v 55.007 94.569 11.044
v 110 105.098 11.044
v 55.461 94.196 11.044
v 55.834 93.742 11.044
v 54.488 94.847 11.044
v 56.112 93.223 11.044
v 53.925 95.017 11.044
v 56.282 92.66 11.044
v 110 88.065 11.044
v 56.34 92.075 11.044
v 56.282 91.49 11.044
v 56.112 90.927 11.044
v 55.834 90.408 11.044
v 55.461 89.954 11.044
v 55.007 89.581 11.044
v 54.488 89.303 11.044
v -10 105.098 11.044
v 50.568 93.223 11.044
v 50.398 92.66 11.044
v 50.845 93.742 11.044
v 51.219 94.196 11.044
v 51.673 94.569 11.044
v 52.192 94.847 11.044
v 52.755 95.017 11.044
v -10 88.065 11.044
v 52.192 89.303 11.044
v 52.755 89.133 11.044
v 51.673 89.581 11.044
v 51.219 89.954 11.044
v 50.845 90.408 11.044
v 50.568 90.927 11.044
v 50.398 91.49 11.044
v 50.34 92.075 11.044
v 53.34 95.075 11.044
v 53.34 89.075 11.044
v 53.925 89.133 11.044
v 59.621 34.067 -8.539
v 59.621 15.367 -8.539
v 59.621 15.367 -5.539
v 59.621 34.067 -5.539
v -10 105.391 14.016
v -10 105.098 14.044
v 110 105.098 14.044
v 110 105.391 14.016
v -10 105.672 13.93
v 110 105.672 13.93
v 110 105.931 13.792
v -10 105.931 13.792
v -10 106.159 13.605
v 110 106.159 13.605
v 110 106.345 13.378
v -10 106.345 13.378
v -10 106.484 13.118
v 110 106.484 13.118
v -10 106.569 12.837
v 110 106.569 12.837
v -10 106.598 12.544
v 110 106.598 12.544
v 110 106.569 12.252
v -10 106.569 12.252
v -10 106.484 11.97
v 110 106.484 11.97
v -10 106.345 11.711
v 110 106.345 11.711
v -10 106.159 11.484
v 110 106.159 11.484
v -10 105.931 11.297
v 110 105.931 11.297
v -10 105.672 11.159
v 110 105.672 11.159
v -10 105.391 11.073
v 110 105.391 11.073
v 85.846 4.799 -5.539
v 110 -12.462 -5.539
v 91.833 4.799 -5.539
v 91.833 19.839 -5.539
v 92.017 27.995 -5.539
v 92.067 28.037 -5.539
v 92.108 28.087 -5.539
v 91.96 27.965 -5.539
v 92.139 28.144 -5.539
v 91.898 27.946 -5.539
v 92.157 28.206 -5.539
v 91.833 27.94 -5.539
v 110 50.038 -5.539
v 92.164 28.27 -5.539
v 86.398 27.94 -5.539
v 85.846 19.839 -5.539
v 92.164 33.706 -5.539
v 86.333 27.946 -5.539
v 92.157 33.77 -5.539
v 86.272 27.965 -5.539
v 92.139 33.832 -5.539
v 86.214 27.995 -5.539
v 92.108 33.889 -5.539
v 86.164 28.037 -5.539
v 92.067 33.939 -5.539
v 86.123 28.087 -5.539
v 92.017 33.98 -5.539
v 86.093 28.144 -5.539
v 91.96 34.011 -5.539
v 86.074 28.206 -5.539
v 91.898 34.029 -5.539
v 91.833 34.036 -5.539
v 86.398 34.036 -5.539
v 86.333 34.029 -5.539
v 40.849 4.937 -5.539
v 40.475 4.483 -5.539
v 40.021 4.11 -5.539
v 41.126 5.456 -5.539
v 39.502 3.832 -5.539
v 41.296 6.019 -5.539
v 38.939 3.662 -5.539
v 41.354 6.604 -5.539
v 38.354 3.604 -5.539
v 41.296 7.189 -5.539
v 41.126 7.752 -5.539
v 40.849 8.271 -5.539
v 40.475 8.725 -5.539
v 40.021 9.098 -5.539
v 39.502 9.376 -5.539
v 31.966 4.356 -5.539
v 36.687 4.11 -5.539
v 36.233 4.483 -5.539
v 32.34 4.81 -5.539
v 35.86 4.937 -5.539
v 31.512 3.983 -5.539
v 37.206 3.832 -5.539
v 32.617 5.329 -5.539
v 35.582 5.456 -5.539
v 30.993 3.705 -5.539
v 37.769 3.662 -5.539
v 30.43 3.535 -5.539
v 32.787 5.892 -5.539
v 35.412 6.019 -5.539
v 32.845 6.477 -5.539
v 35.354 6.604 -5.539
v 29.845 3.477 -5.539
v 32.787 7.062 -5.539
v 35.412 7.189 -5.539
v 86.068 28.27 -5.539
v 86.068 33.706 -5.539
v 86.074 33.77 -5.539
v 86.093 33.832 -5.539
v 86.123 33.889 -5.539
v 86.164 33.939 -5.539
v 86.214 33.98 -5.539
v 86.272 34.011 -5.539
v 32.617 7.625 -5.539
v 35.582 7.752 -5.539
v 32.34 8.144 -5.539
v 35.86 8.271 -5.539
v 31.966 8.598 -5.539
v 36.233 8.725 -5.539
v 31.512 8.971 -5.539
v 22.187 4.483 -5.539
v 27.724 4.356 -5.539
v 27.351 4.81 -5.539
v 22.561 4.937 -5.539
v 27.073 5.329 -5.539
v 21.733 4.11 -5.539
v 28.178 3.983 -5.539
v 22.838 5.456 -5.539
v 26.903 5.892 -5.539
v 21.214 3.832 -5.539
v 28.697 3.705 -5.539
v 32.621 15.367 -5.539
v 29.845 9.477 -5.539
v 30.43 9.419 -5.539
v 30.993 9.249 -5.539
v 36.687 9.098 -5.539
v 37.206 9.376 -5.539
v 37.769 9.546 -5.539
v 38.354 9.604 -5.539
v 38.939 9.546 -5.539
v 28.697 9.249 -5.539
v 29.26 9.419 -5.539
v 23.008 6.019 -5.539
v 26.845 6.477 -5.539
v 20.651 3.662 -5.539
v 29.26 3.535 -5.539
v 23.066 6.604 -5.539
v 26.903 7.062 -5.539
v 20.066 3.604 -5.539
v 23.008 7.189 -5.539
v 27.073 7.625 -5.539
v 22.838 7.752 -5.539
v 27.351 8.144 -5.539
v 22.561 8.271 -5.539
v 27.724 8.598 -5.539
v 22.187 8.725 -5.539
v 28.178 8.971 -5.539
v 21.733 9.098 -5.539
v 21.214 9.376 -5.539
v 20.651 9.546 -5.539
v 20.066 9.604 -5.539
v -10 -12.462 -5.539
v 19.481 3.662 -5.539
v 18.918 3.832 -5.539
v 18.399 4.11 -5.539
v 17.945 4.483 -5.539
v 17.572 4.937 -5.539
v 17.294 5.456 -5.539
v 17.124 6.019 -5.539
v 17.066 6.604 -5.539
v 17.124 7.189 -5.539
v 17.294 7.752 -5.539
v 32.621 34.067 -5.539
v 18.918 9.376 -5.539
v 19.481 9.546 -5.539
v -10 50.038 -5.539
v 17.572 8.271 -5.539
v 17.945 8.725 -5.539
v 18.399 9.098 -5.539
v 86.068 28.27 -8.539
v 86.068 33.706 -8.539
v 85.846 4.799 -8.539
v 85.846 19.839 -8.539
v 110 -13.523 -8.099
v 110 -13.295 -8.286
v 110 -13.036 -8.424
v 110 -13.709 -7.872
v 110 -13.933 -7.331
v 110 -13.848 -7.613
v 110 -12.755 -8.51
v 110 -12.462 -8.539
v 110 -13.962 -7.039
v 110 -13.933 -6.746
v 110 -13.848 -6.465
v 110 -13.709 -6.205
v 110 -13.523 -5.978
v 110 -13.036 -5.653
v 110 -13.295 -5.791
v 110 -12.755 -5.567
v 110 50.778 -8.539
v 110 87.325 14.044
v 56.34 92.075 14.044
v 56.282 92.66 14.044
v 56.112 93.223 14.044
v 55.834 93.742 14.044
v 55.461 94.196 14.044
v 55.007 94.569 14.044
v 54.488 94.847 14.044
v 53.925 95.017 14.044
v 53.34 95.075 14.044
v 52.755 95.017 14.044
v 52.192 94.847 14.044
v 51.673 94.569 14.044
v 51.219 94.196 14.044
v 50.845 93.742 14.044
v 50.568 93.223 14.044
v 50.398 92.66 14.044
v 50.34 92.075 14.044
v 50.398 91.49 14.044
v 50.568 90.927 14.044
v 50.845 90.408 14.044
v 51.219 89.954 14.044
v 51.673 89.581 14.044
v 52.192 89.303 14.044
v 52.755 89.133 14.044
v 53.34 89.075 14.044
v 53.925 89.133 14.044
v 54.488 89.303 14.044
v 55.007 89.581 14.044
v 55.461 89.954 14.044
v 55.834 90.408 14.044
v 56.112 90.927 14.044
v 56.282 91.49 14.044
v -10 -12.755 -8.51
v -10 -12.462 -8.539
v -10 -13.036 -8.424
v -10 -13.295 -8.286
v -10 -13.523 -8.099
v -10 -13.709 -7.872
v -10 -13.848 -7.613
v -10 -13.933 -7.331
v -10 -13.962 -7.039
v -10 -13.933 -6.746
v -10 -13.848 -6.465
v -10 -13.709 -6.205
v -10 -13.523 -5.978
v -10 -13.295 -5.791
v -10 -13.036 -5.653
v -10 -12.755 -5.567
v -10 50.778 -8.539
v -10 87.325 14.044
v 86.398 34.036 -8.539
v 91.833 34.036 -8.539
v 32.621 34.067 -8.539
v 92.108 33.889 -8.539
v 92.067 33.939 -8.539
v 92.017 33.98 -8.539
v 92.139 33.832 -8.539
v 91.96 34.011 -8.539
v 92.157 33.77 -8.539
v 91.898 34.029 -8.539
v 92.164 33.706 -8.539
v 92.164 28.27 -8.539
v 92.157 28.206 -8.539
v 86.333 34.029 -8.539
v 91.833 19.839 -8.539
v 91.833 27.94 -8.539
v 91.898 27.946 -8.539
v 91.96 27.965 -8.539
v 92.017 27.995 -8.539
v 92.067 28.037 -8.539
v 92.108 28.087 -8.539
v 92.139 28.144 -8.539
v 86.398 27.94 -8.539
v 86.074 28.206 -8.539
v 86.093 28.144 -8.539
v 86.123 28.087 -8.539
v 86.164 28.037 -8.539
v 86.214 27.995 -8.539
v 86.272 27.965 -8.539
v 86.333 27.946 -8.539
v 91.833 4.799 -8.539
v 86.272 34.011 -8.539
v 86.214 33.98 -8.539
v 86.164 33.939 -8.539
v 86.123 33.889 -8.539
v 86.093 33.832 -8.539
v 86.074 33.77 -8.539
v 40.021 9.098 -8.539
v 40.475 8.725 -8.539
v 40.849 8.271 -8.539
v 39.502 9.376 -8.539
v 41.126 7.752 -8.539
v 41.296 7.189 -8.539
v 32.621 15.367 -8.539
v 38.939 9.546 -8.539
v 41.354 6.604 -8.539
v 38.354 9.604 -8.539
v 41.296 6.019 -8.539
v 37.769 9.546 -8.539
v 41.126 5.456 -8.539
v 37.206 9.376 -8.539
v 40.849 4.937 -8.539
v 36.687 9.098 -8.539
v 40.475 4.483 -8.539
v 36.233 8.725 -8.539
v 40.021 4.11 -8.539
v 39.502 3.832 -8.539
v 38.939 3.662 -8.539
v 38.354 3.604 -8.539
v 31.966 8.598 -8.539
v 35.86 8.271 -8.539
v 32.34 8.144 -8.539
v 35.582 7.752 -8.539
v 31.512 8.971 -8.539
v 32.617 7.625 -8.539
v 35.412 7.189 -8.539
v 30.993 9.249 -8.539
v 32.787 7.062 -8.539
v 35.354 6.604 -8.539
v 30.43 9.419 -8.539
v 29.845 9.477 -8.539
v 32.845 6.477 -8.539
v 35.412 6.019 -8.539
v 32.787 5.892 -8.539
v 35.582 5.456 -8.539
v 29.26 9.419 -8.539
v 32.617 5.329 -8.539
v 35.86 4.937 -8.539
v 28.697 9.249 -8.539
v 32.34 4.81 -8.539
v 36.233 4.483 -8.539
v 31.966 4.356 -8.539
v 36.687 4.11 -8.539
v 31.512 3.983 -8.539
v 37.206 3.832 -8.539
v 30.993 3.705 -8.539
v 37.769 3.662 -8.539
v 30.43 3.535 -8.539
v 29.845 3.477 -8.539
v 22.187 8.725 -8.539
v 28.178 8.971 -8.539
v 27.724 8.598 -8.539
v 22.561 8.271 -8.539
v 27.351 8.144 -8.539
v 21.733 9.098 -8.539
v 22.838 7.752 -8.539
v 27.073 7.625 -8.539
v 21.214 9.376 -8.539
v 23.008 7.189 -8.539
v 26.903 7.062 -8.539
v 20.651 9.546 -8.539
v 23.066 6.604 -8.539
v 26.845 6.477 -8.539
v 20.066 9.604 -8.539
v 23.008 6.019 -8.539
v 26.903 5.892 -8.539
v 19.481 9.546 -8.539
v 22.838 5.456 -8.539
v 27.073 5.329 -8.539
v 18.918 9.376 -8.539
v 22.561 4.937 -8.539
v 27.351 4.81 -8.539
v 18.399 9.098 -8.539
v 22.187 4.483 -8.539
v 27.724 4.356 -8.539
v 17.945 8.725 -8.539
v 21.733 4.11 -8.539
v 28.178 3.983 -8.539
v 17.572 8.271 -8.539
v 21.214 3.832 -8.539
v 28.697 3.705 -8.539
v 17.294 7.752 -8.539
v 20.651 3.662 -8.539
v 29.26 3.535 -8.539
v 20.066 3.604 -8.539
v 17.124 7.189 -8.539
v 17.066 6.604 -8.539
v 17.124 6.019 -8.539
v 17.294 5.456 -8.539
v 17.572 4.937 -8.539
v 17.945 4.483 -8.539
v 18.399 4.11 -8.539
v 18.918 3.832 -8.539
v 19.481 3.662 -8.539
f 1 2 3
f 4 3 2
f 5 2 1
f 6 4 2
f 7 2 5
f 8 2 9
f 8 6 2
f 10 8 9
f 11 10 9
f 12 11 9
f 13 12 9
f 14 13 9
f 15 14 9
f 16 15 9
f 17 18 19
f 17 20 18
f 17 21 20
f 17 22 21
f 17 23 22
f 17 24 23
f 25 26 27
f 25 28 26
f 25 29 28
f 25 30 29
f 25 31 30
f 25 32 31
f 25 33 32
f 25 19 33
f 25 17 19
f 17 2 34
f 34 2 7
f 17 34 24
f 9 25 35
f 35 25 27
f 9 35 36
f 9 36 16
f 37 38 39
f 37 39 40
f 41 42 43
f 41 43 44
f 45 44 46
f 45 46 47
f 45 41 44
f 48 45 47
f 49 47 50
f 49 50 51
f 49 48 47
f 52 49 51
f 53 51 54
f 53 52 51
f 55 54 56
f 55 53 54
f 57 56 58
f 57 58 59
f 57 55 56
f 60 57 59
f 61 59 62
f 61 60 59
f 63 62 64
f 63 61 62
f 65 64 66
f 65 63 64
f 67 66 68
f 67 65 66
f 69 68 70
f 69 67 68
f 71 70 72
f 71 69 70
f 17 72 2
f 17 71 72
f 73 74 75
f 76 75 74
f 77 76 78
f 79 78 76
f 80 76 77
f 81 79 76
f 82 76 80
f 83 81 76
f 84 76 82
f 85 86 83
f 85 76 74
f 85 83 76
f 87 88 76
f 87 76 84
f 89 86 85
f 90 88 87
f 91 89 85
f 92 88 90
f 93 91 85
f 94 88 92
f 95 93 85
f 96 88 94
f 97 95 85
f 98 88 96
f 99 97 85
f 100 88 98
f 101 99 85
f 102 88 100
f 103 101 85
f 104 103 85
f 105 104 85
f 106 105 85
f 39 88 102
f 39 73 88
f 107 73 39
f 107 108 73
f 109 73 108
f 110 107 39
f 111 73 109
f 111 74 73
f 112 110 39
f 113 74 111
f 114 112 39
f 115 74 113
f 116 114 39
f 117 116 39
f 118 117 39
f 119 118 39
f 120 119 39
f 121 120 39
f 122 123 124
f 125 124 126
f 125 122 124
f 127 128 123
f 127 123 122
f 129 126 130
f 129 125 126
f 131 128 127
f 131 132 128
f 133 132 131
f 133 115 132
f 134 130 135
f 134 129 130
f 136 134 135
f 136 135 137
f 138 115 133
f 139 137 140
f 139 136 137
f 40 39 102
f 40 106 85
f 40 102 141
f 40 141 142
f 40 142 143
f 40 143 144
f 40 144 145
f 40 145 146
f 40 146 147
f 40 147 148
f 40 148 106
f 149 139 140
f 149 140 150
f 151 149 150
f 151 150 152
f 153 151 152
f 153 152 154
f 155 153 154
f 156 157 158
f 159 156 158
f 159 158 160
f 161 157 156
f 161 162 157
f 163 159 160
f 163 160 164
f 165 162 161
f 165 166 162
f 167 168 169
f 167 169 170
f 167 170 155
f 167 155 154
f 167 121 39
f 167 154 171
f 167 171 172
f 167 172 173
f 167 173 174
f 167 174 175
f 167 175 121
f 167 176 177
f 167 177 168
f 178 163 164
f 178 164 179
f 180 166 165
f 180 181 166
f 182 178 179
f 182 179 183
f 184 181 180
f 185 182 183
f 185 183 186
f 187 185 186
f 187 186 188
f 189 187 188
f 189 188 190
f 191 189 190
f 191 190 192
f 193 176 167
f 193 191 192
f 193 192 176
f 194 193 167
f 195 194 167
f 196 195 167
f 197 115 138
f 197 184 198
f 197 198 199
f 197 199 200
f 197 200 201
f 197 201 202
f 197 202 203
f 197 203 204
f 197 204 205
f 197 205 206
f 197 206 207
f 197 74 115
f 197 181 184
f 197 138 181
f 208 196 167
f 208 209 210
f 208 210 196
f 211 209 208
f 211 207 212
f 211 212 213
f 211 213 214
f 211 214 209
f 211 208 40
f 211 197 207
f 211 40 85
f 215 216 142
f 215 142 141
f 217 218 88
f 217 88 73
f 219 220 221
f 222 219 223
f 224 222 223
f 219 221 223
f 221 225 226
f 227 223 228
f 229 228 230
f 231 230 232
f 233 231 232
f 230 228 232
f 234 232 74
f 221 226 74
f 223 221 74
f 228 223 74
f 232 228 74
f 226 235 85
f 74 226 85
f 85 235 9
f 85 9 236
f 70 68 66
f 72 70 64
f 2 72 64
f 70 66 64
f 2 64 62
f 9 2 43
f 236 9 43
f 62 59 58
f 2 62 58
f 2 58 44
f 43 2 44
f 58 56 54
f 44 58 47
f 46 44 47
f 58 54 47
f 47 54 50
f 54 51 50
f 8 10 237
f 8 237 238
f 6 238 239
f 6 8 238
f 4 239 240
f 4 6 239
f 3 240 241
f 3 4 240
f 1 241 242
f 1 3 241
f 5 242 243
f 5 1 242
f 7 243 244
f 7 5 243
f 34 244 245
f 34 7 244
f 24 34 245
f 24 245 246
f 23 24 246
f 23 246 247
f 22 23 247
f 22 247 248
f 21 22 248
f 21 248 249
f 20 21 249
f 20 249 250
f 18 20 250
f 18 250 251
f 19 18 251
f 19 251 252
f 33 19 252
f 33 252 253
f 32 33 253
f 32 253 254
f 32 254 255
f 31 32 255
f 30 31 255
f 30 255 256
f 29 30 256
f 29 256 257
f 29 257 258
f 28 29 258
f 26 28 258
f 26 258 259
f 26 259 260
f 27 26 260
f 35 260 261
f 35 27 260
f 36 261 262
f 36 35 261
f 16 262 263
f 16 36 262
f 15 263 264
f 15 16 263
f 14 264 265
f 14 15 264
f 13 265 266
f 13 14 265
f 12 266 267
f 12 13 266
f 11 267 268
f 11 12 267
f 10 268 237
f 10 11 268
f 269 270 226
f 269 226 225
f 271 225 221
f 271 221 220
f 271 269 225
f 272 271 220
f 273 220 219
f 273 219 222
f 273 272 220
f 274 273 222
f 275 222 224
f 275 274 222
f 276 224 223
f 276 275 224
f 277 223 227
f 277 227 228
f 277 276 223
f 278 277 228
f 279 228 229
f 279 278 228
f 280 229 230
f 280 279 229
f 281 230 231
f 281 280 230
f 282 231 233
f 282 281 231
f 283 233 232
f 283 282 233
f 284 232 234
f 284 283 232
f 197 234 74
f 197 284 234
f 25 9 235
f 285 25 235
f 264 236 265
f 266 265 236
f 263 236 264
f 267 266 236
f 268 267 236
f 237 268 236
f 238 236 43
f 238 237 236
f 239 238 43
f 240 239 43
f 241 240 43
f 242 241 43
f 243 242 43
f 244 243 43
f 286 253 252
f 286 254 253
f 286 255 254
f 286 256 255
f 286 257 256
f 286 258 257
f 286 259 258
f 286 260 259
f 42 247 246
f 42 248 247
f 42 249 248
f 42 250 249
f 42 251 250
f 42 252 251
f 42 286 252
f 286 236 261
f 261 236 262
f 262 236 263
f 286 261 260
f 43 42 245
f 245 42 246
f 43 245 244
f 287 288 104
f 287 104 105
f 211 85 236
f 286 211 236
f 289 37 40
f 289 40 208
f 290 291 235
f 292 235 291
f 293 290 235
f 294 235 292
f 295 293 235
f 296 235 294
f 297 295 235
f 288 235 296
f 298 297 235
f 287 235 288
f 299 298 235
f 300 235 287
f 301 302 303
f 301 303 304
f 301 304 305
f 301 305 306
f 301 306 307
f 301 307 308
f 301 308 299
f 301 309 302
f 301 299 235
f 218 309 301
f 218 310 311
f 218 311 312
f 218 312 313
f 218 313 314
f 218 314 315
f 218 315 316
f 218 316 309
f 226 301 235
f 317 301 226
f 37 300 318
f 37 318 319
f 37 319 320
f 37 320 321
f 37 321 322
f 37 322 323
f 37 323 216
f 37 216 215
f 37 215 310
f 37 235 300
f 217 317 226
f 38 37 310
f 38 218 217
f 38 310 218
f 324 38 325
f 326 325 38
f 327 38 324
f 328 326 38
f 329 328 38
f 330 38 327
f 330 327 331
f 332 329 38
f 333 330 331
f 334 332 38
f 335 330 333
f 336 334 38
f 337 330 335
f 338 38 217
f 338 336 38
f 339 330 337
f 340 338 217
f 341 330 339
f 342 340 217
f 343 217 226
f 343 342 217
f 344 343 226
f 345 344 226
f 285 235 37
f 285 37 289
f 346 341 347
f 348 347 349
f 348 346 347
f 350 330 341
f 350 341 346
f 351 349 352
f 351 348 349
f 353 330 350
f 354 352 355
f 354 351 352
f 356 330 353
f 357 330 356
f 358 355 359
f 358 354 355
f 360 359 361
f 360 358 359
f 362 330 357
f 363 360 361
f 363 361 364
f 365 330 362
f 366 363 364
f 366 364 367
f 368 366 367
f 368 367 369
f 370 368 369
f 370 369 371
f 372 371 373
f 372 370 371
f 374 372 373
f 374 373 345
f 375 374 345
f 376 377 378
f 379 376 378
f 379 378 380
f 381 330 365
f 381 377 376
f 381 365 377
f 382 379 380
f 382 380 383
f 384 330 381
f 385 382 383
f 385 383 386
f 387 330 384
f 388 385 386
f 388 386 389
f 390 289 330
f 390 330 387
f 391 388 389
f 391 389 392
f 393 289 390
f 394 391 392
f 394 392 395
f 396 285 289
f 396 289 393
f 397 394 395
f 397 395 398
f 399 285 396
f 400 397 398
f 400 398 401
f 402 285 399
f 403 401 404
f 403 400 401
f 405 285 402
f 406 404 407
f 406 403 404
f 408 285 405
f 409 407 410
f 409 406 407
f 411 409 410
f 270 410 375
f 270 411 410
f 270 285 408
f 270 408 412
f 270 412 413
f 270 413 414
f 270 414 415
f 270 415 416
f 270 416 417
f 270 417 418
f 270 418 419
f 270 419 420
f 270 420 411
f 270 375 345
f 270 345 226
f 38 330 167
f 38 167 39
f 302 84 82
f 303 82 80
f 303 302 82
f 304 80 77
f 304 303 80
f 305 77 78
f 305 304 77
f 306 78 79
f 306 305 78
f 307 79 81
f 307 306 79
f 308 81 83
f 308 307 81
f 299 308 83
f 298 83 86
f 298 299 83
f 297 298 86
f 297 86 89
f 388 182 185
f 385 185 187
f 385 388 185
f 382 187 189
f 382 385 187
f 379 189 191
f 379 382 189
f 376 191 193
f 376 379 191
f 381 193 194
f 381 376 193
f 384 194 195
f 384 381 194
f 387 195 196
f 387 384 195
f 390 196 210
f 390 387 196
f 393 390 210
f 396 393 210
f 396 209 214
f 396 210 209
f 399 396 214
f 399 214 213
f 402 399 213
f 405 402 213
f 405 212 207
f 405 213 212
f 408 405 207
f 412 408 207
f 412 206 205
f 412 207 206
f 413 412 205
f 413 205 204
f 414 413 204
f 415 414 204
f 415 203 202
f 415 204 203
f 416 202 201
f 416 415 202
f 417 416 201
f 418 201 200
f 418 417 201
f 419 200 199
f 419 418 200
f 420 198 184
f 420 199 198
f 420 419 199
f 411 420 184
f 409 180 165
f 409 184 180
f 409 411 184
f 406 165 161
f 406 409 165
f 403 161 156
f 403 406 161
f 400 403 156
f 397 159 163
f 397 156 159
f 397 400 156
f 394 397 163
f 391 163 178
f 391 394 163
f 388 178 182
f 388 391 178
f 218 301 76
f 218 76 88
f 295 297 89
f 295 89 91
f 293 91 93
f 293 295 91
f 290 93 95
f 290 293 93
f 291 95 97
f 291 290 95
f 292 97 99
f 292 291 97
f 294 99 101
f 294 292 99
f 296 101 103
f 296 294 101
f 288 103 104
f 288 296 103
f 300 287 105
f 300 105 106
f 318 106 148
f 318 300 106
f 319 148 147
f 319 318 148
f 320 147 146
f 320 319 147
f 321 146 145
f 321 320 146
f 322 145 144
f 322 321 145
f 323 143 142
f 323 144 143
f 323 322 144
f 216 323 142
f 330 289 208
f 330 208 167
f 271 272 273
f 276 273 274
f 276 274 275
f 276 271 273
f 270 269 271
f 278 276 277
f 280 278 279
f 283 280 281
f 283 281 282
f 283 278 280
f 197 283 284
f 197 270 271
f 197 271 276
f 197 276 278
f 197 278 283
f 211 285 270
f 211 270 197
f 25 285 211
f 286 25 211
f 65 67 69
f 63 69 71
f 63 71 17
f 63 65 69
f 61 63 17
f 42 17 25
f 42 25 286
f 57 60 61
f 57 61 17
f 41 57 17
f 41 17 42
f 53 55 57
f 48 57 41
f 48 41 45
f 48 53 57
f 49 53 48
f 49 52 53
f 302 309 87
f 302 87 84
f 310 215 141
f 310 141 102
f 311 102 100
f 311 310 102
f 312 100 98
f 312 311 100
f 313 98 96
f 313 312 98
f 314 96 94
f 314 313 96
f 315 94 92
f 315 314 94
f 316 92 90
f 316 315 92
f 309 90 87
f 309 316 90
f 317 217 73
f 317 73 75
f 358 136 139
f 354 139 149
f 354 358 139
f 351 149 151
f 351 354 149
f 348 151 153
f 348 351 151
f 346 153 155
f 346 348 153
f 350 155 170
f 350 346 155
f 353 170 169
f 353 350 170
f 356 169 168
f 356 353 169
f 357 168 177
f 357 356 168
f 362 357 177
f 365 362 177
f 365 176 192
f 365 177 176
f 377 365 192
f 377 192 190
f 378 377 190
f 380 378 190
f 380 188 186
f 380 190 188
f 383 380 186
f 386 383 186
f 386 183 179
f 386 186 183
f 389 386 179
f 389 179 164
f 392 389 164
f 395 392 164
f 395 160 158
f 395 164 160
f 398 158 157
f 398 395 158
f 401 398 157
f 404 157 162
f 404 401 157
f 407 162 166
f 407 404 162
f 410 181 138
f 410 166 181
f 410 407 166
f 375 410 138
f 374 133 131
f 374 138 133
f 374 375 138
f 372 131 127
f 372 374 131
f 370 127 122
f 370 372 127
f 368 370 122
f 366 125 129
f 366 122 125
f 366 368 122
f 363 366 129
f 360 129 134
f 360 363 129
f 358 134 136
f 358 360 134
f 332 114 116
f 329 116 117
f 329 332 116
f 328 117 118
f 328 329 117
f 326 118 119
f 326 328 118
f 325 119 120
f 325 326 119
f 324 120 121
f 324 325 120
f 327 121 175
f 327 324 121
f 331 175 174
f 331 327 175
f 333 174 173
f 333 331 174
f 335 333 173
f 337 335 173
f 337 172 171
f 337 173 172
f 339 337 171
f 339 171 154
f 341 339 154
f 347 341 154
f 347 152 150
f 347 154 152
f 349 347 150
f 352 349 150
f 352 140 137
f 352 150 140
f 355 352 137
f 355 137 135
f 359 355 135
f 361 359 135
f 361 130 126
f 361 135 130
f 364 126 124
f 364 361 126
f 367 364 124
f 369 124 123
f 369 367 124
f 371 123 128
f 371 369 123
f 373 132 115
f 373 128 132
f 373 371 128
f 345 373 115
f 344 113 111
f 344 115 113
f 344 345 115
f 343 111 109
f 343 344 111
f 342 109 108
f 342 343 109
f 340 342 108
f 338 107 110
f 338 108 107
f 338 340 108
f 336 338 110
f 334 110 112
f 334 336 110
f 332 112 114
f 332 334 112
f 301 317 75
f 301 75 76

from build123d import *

# Parameters (mm, degrees)
SALIENTE_EXTRUIR3_DEPTH      = 110
SALIENTE_EXTRUIR3_DEPTH_BACK = 10
CORTAR_EXTRUIR3_START        = -3
CORTAR_EXTRUIR3_OUTLINE_R    = 3
CORTAR_EXTRUIR3_DEPTH        = 22.583018394


# Read off the part's stored shape, not the designer's step: Cortar-Extruir3
with BuildPart() as part:
    # Croquis9 → Saliente-Extruir3 (new, two sides: drawn at the far end of the back side and taken through both)
    with BuildSketch(Plane(origin=(0, 0, 0), x_dir=(0, 0, -1), z_dir=(1, 0, 0)).offset(-SALIENTE_EXTRUIR3_DEPTH_BACK)):
        with BuildLine():
            Line((5.538630524, -12.462), (5.538630524, 50.038))
            Line((5.538630524, 50.038), (-14.04438787, 87.324884341))
            Line((-14.04438787, 87.324884341), (-14.04438787, 93.670477998))
            Line((-14.04438787, 93.670477998), (-14.04438787, 105.09803176))
            ThreePointArc((-14.04438787, 105.09803176), (-12.54438787, 106.59803176), (-11.04438787, 105.09803176))
            Line((-11.04438787, 105.09803176), (-11.04438787, 93.670477998))
            Line((-11.04438787, 93.670477998), (-11.04438787, 88.064764588))
            Line((-11.04438787, 88.064764588), (8.538630524, 50.777880247))
            Line((8.538630524, 50.777880247), (8.538630524, -12.462))
            ThreePointArc((8.538630524, -12.462), (7.038630524, -13.962), (5.538630524, -12.462))
        make_face()
    extrude(amount=SALIENTE_EXTRUIR3_DEPTH + SALIENTE_EXTRUIR3_DEPTH_BACK)

    # Cortar-Extruir3 outline → Cortar-Extruir3 (cut)
    with BuildSketch(Plane.XY.offset(-5.538630524).offset(CORTAR_EXTRUIR3_START)):
        Polygon((91.833498399, 4.799000122), (91.833498399, 19.839000383), (85.846003394, 19.839000122), (85.846004052, 4.799000122), align=None)
        with Locations((20.066122073, 6.603918538)):
            Circle(CORTAR_EXTRUIR3_OUTLINE_R)
        with Locations((29.845121402, 6.476918682)):
            Circle(CORTAR_EXTRUIR3_OUTLINE_R)
        Polygon((59.620998024, 34.067003823), (32.620998024, 34.067001462), (32.620998024, 15.367003823), (59.620998024, 15.367003823), align=None)
        with BuildLine():
            Line((92.16369837, 28.270001136), (92.163697895, 33.705601107))
            ThreePointArc((92.163697895, 33.705601107), (92.066984544, 33.939087777), (91.833497866, 34.035801107))
            Line((91.833497866, 34.035801107), (86.397897866, 34.035800632))
            ThreePointArc((86.397897866, 34.035800632), (86.164411215, 33.939087271), (86.067697895, 33.705600603))
            Line((86.067697895, 33.705600603), (86.06769837, 28.270000603))
            ThreePointArc((86.06769837, 28.270000603), (86.164411732, 28.036513952), (86.397898399, 27.939800632))
            Line((86.397898399, 27.939800632), (91.833498399, 27.939801107))
            ThreePointArc((91.833498399, 27.939801107), (92.066985049, 28.036514469), (92.16369837, 28.270001136))
        make_face()
        with Locations((38.35412218, 6.603918538)):
            Circle(CORTAR_EXTRUIR3_OUTLINE_R)
        with Locations((53.339878017, 92.075080872)):
            Circle(CORTAR_EXTRUIR3_OUTLINE_R)
    extrude(amount=CORTAR_EXTRUIR3_DEPTH, mode=Mode.SUBTRACT)


solid = part.part
